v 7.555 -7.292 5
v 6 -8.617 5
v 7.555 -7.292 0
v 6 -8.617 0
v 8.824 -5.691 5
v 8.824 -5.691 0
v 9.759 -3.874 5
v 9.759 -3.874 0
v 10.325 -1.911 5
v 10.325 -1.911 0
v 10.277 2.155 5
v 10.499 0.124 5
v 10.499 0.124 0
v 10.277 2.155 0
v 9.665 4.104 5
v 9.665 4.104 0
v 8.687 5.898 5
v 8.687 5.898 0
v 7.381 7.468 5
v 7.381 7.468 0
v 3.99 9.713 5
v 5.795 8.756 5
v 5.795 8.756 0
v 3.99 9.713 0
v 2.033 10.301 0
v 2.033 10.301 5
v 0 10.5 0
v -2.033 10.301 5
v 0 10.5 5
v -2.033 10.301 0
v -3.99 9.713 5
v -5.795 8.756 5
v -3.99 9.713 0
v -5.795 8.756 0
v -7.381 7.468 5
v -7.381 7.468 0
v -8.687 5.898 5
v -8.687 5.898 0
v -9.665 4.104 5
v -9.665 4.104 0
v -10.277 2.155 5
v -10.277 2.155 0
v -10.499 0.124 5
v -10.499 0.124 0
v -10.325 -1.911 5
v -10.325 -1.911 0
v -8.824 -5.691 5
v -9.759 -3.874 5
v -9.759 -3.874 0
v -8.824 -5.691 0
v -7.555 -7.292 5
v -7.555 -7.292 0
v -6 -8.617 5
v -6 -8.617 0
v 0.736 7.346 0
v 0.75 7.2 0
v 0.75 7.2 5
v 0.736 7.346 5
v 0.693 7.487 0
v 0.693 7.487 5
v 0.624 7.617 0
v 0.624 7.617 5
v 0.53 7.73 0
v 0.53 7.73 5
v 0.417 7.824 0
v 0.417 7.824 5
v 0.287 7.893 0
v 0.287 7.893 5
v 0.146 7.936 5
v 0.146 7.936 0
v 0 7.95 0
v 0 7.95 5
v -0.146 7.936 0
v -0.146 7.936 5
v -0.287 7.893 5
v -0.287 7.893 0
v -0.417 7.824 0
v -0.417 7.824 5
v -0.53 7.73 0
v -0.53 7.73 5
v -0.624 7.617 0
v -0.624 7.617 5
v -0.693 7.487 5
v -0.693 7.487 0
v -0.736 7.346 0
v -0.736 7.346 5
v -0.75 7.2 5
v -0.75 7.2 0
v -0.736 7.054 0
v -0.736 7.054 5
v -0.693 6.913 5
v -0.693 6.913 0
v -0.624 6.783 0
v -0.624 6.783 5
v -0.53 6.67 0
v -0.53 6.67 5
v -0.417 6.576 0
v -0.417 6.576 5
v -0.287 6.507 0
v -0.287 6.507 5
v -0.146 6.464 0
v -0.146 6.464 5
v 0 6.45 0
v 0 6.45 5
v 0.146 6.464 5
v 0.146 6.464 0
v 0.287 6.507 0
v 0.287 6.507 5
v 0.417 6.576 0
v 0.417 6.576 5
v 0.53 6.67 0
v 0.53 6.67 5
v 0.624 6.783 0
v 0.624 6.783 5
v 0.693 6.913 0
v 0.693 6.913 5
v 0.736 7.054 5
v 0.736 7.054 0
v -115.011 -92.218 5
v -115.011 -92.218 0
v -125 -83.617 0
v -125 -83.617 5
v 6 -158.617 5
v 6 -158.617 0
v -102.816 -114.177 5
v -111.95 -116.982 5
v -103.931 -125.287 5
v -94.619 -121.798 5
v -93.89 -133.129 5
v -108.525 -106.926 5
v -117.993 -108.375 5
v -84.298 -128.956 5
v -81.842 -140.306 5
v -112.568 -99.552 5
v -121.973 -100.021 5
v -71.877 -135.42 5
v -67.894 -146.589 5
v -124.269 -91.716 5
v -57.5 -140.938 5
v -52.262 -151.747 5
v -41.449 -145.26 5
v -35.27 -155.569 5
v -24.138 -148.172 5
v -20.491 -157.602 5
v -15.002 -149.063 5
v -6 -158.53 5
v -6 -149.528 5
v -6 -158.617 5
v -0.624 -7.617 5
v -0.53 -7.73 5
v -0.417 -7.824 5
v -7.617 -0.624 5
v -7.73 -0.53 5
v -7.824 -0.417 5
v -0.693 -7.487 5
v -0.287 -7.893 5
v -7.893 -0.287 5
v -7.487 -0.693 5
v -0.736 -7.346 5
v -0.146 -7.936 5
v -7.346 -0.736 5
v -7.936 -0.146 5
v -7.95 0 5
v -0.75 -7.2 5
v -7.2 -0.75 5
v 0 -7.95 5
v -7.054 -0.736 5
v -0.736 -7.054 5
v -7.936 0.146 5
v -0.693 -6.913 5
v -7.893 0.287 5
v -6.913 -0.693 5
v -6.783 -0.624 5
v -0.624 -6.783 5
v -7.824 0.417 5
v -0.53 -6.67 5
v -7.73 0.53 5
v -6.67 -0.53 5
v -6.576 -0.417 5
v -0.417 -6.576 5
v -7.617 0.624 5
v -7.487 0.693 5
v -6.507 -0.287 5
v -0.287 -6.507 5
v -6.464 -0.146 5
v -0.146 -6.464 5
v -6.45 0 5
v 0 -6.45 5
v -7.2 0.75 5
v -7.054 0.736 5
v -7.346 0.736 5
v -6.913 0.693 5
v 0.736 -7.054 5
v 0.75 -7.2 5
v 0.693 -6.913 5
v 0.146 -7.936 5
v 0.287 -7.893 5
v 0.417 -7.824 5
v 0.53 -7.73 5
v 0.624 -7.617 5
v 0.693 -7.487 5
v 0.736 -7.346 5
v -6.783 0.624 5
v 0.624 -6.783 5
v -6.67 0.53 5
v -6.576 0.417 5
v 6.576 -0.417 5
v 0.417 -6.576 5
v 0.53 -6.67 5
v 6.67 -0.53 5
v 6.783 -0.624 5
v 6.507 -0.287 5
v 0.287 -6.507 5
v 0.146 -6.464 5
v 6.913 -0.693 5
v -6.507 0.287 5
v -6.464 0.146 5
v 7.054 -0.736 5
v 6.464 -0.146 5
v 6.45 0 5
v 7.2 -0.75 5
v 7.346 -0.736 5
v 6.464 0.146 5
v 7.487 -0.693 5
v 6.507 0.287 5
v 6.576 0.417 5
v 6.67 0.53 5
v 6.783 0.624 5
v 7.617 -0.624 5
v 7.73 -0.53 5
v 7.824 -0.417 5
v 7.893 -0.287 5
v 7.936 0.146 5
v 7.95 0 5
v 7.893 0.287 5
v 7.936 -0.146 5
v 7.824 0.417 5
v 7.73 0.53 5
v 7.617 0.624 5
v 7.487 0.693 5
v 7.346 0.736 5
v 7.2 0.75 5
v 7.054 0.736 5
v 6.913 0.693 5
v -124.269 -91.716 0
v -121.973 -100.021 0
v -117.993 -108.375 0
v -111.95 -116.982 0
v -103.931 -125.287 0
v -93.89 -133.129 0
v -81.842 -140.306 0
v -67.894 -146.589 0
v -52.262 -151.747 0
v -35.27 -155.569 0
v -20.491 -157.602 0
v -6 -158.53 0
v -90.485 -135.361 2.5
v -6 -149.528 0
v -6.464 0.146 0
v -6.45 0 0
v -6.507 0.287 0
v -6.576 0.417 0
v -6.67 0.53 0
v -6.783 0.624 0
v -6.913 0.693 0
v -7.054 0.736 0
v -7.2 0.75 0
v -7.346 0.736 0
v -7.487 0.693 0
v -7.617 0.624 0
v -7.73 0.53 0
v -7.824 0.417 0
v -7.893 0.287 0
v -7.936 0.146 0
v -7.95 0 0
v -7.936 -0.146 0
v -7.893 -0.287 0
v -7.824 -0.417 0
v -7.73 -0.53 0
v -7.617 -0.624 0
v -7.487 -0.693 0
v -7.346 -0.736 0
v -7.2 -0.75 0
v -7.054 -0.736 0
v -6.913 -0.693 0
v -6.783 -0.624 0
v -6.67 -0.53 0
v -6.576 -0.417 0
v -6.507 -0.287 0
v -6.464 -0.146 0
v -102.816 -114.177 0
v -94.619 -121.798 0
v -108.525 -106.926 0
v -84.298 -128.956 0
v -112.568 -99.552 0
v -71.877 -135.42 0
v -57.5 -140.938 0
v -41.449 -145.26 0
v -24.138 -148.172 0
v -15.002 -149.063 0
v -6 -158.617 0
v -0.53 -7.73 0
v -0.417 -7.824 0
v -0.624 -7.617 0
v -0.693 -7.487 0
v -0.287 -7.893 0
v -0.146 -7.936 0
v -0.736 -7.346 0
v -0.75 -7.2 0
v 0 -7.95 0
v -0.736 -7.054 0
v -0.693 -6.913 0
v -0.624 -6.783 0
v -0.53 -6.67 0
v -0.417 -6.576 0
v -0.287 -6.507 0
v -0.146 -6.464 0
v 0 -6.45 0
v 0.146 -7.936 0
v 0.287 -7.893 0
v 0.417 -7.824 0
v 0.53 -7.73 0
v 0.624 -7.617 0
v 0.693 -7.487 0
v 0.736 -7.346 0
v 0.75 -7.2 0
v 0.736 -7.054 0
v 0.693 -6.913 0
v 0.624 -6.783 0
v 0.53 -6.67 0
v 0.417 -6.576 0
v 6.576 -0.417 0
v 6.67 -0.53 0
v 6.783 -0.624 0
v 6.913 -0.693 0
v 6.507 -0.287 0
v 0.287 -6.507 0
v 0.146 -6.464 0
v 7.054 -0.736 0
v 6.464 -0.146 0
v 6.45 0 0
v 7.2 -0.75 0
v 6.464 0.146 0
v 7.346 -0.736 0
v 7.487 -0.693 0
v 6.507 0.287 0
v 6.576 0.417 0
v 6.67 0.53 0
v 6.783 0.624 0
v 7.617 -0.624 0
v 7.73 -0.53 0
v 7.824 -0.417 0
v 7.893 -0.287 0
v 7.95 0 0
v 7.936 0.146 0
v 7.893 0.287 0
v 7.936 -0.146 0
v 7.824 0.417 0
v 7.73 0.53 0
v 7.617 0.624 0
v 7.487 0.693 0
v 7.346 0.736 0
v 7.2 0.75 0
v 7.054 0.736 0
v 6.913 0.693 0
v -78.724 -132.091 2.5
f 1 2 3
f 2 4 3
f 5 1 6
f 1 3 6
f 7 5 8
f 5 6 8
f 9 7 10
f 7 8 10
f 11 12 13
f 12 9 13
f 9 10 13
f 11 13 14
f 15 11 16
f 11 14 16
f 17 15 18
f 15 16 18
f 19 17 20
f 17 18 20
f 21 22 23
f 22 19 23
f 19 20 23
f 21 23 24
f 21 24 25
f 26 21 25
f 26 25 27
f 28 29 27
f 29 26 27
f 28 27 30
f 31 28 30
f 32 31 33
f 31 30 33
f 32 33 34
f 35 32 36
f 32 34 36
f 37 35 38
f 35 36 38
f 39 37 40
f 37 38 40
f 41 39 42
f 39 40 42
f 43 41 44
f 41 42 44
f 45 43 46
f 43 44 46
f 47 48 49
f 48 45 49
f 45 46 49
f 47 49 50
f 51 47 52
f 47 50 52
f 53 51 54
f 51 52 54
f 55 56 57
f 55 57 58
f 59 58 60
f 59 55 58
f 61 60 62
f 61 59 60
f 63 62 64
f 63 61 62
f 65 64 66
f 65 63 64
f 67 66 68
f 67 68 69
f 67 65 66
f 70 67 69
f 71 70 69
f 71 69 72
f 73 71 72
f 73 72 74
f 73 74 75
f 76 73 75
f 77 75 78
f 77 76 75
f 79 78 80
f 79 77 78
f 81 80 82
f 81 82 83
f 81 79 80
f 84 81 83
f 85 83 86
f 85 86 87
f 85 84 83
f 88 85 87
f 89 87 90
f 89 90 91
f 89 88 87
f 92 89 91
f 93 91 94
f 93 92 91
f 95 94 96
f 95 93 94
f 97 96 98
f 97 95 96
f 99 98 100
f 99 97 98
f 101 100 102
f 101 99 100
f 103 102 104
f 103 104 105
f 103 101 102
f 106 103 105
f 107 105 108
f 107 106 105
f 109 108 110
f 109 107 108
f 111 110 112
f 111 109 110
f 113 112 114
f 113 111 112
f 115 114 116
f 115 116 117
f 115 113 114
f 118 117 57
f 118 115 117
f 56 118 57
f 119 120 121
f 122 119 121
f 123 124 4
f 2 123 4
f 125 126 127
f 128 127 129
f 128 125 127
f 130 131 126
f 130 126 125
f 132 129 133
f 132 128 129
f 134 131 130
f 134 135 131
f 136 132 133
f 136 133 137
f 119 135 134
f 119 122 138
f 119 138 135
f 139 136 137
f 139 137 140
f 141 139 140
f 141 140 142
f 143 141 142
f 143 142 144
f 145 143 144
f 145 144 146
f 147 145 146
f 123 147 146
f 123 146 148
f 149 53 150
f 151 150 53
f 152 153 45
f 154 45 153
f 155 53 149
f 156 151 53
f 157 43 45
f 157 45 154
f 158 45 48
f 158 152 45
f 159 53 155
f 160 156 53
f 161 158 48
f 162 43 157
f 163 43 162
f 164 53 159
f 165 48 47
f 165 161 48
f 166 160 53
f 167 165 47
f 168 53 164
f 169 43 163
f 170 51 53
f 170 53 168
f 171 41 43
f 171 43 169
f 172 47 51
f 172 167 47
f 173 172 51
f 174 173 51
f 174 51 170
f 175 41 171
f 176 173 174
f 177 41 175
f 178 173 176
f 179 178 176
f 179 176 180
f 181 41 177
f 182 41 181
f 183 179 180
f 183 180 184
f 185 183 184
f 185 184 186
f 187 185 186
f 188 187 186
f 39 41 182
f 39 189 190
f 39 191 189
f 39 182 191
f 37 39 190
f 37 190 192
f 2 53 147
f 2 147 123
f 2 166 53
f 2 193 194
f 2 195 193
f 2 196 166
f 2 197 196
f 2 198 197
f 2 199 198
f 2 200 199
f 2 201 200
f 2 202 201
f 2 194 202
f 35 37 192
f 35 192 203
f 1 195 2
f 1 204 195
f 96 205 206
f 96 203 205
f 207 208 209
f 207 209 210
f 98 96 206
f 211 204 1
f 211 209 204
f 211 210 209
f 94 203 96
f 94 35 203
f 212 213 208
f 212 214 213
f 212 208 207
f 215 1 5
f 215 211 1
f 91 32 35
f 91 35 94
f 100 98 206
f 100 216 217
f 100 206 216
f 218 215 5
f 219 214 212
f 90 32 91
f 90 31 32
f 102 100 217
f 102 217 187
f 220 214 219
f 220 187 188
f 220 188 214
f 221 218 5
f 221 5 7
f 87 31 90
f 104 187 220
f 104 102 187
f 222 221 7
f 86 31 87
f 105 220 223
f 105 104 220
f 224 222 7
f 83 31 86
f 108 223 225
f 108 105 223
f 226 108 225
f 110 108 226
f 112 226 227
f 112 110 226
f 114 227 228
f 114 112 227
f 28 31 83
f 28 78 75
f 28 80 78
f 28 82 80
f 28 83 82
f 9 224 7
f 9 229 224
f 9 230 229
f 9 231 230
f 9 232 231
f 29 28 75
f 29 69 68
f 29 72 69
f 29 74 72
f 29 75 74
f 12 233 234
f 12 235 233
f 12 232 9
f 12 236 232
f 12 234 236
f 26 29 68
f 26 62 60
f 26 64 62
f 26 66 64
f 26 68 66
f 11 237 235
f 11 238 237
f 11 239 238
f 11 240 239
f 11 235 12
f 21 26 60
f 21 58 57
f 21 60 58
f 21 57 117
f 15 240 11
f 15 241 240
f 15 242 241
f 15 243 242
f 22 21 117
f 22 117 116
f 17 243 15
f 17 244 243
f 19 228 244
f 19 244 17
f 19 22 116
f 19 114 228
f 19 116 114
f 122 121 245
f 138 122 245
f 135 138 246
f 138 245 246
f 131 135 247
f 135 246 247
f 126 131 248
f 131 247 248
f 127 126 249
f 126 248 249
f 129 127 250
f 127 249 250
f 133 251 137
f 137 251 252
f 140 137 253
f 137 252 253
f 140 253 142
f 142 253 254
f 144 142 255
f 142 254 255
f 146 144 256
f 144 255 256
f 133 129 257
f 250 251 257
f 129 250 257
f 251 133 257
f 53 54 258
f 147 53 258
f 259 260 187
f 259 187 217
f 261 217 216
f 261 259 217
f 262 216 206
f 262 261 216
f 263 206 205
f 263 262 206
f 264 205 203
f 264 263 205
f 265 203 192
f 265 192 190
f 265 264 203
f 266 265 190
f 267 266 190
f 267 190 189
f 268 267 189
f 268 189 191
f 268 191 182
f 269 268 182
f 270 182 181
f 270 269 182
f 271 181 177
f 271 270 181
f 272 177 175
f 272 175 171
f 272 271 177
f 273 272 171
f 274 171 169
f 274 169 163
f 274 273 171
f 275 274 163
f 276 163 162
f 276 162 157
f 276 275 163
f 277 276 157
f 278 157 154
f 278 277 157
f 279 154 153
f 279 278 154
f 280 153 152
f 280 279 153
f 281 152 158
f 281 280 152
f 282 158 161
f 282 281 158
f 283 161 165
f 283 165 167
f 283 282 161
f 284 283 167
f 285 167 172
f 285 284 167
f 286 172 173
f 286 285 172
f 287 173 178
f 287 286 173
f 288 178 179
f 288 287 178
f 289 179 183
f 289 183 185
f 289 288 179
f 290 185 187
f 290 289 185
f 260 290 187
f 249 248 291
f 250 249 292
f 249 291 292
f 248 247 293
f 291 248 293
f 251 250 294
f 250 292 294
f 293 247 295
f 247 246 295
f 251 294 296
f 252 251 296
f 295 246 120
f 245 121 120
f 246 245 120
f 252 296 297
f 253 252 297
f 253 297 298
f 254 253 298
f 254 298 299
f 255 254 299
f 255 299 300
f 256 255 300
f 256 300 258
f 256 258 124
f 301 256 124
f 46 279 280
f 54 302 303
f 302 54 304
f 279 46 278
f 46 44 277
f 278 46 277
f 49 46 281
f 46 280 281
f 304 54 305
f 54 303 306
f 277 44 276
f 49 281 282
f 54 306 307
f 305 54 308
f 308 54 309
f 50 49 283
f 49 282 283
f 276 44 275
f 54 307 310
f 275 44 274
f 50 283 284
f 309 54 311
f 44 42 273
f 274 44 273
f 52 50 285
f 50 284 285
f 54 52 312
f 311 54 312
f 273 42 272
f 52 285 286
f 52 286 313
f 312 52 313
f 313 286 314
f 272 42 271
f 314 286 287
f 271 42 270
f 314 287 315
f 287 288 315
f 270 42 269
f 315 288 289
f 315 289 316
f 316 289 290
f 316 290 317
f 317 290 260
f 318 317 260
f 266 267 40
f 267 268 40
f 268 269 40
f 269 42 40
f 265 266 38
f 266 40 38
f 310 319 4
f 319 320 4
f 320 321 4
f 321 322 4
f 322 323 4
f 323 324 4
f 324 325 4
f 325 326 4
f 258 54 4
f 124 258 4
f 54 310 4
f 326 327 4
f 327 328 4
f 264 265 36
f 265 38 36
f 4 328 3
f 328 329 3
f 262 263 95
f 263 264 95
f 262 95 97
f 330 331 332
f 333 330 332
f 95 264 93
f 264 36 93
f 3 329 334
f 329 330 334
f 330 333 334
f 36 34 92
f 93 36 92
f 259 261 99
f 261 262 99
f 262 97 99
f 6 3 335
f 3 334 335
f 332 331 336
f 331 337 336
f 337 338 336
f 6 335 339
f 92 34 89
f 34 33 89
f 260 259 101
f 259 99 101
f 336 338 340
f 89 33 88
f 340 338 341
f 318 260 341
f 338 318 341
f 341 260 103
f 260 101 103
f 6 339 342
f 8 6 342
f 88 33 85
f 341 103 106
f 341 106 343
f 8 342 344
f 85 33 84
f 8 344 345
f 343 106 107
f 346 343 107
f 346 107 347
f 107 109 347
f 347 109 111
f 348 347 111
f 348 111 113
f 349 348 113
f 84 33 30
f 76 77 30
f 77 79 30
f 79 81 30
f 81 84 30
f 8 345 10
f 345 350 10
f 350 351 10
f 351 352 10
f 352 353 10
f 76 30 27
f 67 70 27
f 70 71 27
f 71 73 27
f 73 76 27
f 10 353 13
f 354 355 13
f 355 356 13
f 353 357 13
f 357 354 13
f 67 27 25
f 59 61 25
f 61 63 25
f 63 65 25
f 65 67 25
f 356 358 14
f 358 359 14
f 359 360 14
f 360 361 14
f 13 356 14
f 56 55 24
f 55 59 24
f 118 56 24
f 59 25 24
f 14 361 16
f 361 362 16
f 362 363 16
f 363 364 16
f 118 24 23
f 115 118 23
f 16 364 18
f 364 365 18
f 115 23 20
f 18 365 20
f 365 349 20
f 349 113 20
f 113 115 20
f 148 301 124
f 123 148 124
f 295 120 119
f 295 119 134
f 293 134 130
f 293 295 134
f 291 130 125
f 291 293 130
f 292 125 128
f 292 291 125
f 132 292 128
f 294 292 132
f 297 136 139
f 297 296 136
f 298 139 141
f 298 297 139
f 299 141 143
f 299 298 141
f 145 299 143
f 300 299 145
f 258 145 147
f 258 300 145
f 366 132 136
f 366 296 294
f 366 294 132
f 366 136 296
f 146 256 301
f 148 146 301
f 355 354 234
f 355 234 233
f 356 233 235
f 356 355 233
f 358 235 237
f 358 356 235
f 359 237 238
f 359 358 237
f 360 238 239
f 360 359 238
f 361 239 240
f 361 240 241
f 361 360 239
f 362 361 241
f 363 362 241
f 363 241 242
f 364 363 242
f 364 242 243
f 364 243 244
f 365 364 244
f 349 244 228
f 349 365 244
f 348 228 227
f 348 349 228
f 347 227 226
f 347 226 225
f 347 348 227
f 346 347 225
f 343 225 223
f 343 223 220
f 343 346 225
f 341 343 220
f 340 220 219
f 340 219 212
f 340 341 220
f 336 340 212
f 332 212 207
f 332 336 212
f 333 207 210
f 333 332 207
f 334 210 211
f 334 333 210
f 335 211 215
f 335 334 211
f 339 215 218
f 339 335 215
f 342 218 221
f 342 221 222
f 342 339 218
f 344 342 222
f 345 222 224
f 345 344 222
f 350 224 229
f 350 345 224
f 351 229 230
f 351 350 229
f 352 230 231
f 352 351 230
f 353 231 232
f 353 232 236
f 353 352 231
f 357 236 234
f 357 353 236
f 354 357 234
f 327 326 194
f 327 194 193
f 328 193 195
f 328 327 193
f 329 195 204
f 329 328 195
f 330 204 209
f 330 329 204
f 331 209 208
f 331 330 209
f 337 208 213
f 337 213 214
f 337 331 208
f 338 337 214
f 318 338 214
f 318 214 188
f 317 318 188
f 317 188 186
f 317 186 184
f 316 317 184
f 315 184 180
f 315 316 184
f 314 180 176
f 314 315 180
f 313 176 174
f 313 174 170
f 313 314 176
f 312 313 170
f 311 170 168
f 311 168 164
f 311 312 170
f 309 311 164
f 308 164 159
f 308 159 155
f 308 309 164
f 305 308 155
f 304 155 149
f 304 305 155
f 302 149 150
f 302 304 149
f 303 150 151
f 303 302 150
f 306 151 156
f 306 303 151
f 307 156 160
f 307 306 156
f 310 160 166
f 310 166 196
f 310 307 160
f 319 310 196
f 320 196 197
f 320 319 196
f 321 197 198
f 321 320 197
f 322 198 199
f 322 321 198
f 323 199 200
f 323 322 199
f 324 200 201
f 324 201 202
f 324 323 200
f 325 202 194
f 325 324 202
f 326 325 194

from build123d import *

# Parameters (mm, degrees)
F0_R     = 10.5
F0_R_2   = 0.75
F1_DEPTH = 5
F3_DEPTH = 5


# Not quite as in the source:
# - a feature names something its author has since deleted; it is built from what else it names


with BuildPart() as f1:
    # F0 (on Top) → F1 (new body)
    with BuildSketch(Plane.XY):
        Circle(F0_R)
        with Locations((-3.45, -7.2)):
            Circle(F0_R_2, mode=Mode.SUBTRACT)
        with Locations((-7.2, -3.45)):
            Circle(F0_R_2, mode=Mode.SUBTRACT)
        with Locations((0, -7.2)):
            Circle(F0_R_2, mode=Mode.SUBTRACT)
        with Locations((3.45, -7.2)):
            Circle(F0_R_2, mode=Mode.SUBTRACT)
        with Locations((7.2, -3.45)):
            Circle(F0_R_2, mode=Mode.SUBTRACT)
        with Locations((-7.2, 0)):
            Circle(F0_R_2, mode=Mode.SUBTRACT)
        with Locations((-7.2, 3.45)):
            Circle(F0_R_2, mode=Mode.SUBTRACT)
        with Locations((-3.45, 7.2)):
            Circle(F0_R_2, mode=Mode.SUBTRACT)
        with Locations((7.2, 0)):
            Circle(F0_R_2, mode=Mode.SUBTRACT)
        with Locations((7.2, 3.45)):
            Circle(F0_R_2, mode=Mode.SUBTRACT)
        with Locations((0, 7.2)):
            Circle(F0_R_2, mode=Mode.SUBTRACT)
        with Locations((3.45, 7.2)):
            Circle(F0_R_2, mode=Mode.SUBTRACT)
        with Locations((3.45, -7.2)):
            Circle(F0_R_2)
        with Locations((-3.45, -7.2)):
            Circle(F0_R_2)
        with Locations((-7.2, -3.45)):
            Circle(F0_R_2)
        with Locations((-7.2, 3.45)):
            Circle(F0_R_2)
        with Locations((-3.45, 7.2)):
            Circle(F0_R_2)
        with Locations((3.45, 7.2)):
            Circle(F0_R_2)
        with Locations((7.2, 3.45)):
            Circle(F0_R_2)
        with Locations((7.2, -3.45)):
            Circle(F0_R_2)
    extrude(amount=F1_DEPTH)

    # F2 (on Top) → F3 (join, through all)
    with BuildSketch(Plane.XY):
        with BuildLine():
            Line((6, -8.7032937936), (6, -8.6168439698))
            Line((6, -8.6168439698), (-5.159e-07, -8.6168439698))
            add(Edge.make_bspline(
                [(6, -8.7032937936), (3.0017297357, -8.6168439624), (-5.159e-07, -8.6168439698)],
                knots=[4.6643705292, 4.6643705292, 4.6643705292, 4.7123889845, 4.7123889845, 4.7123889845], degree=2, weights=[1, 0.9997117923, 1]))
        make_face()
        with BuildLine():
            add(Edge.make_bspline(
                [(-5.159e-07, -8.6168439698), (-3.0017302513, -8.6168439772), (-6, -8.7032937936)],
                knots=[4.7123889845, 4.7123889845, 4.7123889845, 4.7604074315, 4.7604074315, 4.7604074315], degree=2, weights=[1, 0.9997117924, 1]))
            Line((-5.159e-07, -8.6168439698), (-6, -8.6168439698))
            Line((-6, -8.6168439698), (-6, -8.7032937936))
        make_face()
        with BuildLine():
            Line((6, -158.6168439698), (6, -158.530394146))
            add(Edge.make_bspline(
                [(0, -158.6168439698), (3.0017299935, -158.6168439698), (6, -158.530394146)],
                knots=[1.5707963268, 1.5707963268, 1.5707963268, 1.6188147779, 1.6188147779, 1.6188147779], degree=2, weights=[1, 0.9997117924, 1]))
            Line((0, -158.6168439698), (6, -158.6168439698))
        make_face()
        with BuildLine():
            Line((-6, -158.6168439698), (0, -158.6168439698))
            add(Edge.make_bspline(
                [(-6, -158.530394146), (-3.0017299935, -158.6168439698), (0, -158.6168439698)],
                knots=[1.5227778757, 1.5227778757, 1.5227778757, 1.5707963268, 1.5707963268, 1.5707963268], degree=2, weights=[1, 0.9997117924, 1]))
            Line((-6, -158.530394146), (-6, -158.6168439698))
        make_face()
        with BuildLine():
            add(Edge.make_bspline(
                [(0, -158.6168439698), (3.0017299935, -158.6168439698), (6, -158.530394146)],
                knots=[1.5707963268, 1.5707963268, 1.5707963268, 1.6188147779, 1.6188147779, 1.6188147779], degree=2, weights=[1, 0.9997117924, 1]))
            Line((6, -158.530394146), (6, -149.528497087))
            add(Edge.make_bspline(
                [(-6, -149.528497087), (0, -149.7053092713), (6, -149.528497087)],
                knots=[1.5190490974, 1.5190490974, 1.5190490974, 1.6225435562, 1.6225435562, 1.6225435562], degree=2, weights=[1, 0.9986614109, 1]))
            Line((-6, -149.528497087), (-6, -158.530394146))
            add(Edge.make_bspline(
                [(-6, -158.530394146), (-3.0017299935, -158.6168439698), (0, -158.6168439698)],
                knots=[1.5227778757, 1.5227778757, 1.5227778757, 1.5707963268, 1.5707963268, 1.5707963268], degree=2, weights=[1, 0.9997117924, 1]))
        make_face()
        with BuildLine():
            add(Edge.make_bspline(
                [(6, -8.7032937936), (3.0017297357, -8.6168439624), (-5.159e-07, -8.6168439698)],
                knots=[4.6643705292, 4.6643705292, 4.6643705292, 4.7123889845, 4.7123889845, 4.7123889845], degree=2, weights=[1, 0.9997117923, 1]))
            add(Edge.make_bspline(
                [(-5.159e-07, -8.6168439698), (-3.0017302513, -8.6168439772), (-6, -8.7032937936)],
                knots=[4.7123889845, 4.7123889845, 4.7123889845, 4.7604074315, 4.7604074315, 4.7604074315], degree=2, weights=[1, 0.9997117924, 1]))
            Line((-6, -8.7032937936), (-6, -17.7051908526))
            add(Edge.make_bspline(
                [(6, -17.7051908526), (0, -17.5283786684), (-6, -17.7051908526)],
                knots=[4.660641751, 4.660641751, 4.660641751, 4.7641362098, 4.7641362098, 4.7641362098], degree=2, weights=[1, 0.9986614109, 1]))
            Line((6, -17.7051908526), (6, -8.7032937936))
        make_face()
        with BuildLine():
            Line((6, -149.528497087), (6, -17.7051908526))
            add(Edge.make_bspline(
                [(6, -17.7051908526), (0, -17.5283786684), (-6, -17.7051908526)],
                knots=[4.660641751, 4.660641751, 4.660641751, 4.7641362098, 4.7641362098, 4.7641362098], degree=2, weights=[1, 0.9986614109, 1]))
            Line((-6, -17.7051908526), (-6, -149.528497087))
            add(Edge.make_bspline(
                [(-6, -149.528497087), (0, -149.7053092713), (6, -149.528497087)],
                knots=[1.5190490974, 1.5190490974, 1.5190490974, 1.6225435562, 1.6225435562, 1.6225435562], degree=2, weights=[1, 0.9986614109, 1]))
        make_face()
        with BuildLine():
            Line((-115.0107222667, -92.2180852847), (-125, -83.6168439698))
            add(Edge.make_bspline(
                [(-125, -83.6168439698), (-125, -155.0992391761), (-6, -158.530394146)],
                knots=[0, 0, 0, 1.5227778757, 1.5227778757, 1.5227778757], degree=2, weights=[1, 0.7238784428, 1]))
            Line((-6, -158.530394146), (-6, -149.528497087))
            add(Edge.make_bspline(
                [(-115.0107222667, -92.2180852847), (-102.427295797, -146.686910289), (-6, -149.528497087)],
                knots=[0.1306935792, 0.1306935792, 0.1306935792, 1.5190490974, 1.5190490974, 1.5190490974], degree=2, weights=[1, 0.7685799932, 1]))
        make_face()
    extrude(amount=F3_DEPTH)


solid = f1.part
